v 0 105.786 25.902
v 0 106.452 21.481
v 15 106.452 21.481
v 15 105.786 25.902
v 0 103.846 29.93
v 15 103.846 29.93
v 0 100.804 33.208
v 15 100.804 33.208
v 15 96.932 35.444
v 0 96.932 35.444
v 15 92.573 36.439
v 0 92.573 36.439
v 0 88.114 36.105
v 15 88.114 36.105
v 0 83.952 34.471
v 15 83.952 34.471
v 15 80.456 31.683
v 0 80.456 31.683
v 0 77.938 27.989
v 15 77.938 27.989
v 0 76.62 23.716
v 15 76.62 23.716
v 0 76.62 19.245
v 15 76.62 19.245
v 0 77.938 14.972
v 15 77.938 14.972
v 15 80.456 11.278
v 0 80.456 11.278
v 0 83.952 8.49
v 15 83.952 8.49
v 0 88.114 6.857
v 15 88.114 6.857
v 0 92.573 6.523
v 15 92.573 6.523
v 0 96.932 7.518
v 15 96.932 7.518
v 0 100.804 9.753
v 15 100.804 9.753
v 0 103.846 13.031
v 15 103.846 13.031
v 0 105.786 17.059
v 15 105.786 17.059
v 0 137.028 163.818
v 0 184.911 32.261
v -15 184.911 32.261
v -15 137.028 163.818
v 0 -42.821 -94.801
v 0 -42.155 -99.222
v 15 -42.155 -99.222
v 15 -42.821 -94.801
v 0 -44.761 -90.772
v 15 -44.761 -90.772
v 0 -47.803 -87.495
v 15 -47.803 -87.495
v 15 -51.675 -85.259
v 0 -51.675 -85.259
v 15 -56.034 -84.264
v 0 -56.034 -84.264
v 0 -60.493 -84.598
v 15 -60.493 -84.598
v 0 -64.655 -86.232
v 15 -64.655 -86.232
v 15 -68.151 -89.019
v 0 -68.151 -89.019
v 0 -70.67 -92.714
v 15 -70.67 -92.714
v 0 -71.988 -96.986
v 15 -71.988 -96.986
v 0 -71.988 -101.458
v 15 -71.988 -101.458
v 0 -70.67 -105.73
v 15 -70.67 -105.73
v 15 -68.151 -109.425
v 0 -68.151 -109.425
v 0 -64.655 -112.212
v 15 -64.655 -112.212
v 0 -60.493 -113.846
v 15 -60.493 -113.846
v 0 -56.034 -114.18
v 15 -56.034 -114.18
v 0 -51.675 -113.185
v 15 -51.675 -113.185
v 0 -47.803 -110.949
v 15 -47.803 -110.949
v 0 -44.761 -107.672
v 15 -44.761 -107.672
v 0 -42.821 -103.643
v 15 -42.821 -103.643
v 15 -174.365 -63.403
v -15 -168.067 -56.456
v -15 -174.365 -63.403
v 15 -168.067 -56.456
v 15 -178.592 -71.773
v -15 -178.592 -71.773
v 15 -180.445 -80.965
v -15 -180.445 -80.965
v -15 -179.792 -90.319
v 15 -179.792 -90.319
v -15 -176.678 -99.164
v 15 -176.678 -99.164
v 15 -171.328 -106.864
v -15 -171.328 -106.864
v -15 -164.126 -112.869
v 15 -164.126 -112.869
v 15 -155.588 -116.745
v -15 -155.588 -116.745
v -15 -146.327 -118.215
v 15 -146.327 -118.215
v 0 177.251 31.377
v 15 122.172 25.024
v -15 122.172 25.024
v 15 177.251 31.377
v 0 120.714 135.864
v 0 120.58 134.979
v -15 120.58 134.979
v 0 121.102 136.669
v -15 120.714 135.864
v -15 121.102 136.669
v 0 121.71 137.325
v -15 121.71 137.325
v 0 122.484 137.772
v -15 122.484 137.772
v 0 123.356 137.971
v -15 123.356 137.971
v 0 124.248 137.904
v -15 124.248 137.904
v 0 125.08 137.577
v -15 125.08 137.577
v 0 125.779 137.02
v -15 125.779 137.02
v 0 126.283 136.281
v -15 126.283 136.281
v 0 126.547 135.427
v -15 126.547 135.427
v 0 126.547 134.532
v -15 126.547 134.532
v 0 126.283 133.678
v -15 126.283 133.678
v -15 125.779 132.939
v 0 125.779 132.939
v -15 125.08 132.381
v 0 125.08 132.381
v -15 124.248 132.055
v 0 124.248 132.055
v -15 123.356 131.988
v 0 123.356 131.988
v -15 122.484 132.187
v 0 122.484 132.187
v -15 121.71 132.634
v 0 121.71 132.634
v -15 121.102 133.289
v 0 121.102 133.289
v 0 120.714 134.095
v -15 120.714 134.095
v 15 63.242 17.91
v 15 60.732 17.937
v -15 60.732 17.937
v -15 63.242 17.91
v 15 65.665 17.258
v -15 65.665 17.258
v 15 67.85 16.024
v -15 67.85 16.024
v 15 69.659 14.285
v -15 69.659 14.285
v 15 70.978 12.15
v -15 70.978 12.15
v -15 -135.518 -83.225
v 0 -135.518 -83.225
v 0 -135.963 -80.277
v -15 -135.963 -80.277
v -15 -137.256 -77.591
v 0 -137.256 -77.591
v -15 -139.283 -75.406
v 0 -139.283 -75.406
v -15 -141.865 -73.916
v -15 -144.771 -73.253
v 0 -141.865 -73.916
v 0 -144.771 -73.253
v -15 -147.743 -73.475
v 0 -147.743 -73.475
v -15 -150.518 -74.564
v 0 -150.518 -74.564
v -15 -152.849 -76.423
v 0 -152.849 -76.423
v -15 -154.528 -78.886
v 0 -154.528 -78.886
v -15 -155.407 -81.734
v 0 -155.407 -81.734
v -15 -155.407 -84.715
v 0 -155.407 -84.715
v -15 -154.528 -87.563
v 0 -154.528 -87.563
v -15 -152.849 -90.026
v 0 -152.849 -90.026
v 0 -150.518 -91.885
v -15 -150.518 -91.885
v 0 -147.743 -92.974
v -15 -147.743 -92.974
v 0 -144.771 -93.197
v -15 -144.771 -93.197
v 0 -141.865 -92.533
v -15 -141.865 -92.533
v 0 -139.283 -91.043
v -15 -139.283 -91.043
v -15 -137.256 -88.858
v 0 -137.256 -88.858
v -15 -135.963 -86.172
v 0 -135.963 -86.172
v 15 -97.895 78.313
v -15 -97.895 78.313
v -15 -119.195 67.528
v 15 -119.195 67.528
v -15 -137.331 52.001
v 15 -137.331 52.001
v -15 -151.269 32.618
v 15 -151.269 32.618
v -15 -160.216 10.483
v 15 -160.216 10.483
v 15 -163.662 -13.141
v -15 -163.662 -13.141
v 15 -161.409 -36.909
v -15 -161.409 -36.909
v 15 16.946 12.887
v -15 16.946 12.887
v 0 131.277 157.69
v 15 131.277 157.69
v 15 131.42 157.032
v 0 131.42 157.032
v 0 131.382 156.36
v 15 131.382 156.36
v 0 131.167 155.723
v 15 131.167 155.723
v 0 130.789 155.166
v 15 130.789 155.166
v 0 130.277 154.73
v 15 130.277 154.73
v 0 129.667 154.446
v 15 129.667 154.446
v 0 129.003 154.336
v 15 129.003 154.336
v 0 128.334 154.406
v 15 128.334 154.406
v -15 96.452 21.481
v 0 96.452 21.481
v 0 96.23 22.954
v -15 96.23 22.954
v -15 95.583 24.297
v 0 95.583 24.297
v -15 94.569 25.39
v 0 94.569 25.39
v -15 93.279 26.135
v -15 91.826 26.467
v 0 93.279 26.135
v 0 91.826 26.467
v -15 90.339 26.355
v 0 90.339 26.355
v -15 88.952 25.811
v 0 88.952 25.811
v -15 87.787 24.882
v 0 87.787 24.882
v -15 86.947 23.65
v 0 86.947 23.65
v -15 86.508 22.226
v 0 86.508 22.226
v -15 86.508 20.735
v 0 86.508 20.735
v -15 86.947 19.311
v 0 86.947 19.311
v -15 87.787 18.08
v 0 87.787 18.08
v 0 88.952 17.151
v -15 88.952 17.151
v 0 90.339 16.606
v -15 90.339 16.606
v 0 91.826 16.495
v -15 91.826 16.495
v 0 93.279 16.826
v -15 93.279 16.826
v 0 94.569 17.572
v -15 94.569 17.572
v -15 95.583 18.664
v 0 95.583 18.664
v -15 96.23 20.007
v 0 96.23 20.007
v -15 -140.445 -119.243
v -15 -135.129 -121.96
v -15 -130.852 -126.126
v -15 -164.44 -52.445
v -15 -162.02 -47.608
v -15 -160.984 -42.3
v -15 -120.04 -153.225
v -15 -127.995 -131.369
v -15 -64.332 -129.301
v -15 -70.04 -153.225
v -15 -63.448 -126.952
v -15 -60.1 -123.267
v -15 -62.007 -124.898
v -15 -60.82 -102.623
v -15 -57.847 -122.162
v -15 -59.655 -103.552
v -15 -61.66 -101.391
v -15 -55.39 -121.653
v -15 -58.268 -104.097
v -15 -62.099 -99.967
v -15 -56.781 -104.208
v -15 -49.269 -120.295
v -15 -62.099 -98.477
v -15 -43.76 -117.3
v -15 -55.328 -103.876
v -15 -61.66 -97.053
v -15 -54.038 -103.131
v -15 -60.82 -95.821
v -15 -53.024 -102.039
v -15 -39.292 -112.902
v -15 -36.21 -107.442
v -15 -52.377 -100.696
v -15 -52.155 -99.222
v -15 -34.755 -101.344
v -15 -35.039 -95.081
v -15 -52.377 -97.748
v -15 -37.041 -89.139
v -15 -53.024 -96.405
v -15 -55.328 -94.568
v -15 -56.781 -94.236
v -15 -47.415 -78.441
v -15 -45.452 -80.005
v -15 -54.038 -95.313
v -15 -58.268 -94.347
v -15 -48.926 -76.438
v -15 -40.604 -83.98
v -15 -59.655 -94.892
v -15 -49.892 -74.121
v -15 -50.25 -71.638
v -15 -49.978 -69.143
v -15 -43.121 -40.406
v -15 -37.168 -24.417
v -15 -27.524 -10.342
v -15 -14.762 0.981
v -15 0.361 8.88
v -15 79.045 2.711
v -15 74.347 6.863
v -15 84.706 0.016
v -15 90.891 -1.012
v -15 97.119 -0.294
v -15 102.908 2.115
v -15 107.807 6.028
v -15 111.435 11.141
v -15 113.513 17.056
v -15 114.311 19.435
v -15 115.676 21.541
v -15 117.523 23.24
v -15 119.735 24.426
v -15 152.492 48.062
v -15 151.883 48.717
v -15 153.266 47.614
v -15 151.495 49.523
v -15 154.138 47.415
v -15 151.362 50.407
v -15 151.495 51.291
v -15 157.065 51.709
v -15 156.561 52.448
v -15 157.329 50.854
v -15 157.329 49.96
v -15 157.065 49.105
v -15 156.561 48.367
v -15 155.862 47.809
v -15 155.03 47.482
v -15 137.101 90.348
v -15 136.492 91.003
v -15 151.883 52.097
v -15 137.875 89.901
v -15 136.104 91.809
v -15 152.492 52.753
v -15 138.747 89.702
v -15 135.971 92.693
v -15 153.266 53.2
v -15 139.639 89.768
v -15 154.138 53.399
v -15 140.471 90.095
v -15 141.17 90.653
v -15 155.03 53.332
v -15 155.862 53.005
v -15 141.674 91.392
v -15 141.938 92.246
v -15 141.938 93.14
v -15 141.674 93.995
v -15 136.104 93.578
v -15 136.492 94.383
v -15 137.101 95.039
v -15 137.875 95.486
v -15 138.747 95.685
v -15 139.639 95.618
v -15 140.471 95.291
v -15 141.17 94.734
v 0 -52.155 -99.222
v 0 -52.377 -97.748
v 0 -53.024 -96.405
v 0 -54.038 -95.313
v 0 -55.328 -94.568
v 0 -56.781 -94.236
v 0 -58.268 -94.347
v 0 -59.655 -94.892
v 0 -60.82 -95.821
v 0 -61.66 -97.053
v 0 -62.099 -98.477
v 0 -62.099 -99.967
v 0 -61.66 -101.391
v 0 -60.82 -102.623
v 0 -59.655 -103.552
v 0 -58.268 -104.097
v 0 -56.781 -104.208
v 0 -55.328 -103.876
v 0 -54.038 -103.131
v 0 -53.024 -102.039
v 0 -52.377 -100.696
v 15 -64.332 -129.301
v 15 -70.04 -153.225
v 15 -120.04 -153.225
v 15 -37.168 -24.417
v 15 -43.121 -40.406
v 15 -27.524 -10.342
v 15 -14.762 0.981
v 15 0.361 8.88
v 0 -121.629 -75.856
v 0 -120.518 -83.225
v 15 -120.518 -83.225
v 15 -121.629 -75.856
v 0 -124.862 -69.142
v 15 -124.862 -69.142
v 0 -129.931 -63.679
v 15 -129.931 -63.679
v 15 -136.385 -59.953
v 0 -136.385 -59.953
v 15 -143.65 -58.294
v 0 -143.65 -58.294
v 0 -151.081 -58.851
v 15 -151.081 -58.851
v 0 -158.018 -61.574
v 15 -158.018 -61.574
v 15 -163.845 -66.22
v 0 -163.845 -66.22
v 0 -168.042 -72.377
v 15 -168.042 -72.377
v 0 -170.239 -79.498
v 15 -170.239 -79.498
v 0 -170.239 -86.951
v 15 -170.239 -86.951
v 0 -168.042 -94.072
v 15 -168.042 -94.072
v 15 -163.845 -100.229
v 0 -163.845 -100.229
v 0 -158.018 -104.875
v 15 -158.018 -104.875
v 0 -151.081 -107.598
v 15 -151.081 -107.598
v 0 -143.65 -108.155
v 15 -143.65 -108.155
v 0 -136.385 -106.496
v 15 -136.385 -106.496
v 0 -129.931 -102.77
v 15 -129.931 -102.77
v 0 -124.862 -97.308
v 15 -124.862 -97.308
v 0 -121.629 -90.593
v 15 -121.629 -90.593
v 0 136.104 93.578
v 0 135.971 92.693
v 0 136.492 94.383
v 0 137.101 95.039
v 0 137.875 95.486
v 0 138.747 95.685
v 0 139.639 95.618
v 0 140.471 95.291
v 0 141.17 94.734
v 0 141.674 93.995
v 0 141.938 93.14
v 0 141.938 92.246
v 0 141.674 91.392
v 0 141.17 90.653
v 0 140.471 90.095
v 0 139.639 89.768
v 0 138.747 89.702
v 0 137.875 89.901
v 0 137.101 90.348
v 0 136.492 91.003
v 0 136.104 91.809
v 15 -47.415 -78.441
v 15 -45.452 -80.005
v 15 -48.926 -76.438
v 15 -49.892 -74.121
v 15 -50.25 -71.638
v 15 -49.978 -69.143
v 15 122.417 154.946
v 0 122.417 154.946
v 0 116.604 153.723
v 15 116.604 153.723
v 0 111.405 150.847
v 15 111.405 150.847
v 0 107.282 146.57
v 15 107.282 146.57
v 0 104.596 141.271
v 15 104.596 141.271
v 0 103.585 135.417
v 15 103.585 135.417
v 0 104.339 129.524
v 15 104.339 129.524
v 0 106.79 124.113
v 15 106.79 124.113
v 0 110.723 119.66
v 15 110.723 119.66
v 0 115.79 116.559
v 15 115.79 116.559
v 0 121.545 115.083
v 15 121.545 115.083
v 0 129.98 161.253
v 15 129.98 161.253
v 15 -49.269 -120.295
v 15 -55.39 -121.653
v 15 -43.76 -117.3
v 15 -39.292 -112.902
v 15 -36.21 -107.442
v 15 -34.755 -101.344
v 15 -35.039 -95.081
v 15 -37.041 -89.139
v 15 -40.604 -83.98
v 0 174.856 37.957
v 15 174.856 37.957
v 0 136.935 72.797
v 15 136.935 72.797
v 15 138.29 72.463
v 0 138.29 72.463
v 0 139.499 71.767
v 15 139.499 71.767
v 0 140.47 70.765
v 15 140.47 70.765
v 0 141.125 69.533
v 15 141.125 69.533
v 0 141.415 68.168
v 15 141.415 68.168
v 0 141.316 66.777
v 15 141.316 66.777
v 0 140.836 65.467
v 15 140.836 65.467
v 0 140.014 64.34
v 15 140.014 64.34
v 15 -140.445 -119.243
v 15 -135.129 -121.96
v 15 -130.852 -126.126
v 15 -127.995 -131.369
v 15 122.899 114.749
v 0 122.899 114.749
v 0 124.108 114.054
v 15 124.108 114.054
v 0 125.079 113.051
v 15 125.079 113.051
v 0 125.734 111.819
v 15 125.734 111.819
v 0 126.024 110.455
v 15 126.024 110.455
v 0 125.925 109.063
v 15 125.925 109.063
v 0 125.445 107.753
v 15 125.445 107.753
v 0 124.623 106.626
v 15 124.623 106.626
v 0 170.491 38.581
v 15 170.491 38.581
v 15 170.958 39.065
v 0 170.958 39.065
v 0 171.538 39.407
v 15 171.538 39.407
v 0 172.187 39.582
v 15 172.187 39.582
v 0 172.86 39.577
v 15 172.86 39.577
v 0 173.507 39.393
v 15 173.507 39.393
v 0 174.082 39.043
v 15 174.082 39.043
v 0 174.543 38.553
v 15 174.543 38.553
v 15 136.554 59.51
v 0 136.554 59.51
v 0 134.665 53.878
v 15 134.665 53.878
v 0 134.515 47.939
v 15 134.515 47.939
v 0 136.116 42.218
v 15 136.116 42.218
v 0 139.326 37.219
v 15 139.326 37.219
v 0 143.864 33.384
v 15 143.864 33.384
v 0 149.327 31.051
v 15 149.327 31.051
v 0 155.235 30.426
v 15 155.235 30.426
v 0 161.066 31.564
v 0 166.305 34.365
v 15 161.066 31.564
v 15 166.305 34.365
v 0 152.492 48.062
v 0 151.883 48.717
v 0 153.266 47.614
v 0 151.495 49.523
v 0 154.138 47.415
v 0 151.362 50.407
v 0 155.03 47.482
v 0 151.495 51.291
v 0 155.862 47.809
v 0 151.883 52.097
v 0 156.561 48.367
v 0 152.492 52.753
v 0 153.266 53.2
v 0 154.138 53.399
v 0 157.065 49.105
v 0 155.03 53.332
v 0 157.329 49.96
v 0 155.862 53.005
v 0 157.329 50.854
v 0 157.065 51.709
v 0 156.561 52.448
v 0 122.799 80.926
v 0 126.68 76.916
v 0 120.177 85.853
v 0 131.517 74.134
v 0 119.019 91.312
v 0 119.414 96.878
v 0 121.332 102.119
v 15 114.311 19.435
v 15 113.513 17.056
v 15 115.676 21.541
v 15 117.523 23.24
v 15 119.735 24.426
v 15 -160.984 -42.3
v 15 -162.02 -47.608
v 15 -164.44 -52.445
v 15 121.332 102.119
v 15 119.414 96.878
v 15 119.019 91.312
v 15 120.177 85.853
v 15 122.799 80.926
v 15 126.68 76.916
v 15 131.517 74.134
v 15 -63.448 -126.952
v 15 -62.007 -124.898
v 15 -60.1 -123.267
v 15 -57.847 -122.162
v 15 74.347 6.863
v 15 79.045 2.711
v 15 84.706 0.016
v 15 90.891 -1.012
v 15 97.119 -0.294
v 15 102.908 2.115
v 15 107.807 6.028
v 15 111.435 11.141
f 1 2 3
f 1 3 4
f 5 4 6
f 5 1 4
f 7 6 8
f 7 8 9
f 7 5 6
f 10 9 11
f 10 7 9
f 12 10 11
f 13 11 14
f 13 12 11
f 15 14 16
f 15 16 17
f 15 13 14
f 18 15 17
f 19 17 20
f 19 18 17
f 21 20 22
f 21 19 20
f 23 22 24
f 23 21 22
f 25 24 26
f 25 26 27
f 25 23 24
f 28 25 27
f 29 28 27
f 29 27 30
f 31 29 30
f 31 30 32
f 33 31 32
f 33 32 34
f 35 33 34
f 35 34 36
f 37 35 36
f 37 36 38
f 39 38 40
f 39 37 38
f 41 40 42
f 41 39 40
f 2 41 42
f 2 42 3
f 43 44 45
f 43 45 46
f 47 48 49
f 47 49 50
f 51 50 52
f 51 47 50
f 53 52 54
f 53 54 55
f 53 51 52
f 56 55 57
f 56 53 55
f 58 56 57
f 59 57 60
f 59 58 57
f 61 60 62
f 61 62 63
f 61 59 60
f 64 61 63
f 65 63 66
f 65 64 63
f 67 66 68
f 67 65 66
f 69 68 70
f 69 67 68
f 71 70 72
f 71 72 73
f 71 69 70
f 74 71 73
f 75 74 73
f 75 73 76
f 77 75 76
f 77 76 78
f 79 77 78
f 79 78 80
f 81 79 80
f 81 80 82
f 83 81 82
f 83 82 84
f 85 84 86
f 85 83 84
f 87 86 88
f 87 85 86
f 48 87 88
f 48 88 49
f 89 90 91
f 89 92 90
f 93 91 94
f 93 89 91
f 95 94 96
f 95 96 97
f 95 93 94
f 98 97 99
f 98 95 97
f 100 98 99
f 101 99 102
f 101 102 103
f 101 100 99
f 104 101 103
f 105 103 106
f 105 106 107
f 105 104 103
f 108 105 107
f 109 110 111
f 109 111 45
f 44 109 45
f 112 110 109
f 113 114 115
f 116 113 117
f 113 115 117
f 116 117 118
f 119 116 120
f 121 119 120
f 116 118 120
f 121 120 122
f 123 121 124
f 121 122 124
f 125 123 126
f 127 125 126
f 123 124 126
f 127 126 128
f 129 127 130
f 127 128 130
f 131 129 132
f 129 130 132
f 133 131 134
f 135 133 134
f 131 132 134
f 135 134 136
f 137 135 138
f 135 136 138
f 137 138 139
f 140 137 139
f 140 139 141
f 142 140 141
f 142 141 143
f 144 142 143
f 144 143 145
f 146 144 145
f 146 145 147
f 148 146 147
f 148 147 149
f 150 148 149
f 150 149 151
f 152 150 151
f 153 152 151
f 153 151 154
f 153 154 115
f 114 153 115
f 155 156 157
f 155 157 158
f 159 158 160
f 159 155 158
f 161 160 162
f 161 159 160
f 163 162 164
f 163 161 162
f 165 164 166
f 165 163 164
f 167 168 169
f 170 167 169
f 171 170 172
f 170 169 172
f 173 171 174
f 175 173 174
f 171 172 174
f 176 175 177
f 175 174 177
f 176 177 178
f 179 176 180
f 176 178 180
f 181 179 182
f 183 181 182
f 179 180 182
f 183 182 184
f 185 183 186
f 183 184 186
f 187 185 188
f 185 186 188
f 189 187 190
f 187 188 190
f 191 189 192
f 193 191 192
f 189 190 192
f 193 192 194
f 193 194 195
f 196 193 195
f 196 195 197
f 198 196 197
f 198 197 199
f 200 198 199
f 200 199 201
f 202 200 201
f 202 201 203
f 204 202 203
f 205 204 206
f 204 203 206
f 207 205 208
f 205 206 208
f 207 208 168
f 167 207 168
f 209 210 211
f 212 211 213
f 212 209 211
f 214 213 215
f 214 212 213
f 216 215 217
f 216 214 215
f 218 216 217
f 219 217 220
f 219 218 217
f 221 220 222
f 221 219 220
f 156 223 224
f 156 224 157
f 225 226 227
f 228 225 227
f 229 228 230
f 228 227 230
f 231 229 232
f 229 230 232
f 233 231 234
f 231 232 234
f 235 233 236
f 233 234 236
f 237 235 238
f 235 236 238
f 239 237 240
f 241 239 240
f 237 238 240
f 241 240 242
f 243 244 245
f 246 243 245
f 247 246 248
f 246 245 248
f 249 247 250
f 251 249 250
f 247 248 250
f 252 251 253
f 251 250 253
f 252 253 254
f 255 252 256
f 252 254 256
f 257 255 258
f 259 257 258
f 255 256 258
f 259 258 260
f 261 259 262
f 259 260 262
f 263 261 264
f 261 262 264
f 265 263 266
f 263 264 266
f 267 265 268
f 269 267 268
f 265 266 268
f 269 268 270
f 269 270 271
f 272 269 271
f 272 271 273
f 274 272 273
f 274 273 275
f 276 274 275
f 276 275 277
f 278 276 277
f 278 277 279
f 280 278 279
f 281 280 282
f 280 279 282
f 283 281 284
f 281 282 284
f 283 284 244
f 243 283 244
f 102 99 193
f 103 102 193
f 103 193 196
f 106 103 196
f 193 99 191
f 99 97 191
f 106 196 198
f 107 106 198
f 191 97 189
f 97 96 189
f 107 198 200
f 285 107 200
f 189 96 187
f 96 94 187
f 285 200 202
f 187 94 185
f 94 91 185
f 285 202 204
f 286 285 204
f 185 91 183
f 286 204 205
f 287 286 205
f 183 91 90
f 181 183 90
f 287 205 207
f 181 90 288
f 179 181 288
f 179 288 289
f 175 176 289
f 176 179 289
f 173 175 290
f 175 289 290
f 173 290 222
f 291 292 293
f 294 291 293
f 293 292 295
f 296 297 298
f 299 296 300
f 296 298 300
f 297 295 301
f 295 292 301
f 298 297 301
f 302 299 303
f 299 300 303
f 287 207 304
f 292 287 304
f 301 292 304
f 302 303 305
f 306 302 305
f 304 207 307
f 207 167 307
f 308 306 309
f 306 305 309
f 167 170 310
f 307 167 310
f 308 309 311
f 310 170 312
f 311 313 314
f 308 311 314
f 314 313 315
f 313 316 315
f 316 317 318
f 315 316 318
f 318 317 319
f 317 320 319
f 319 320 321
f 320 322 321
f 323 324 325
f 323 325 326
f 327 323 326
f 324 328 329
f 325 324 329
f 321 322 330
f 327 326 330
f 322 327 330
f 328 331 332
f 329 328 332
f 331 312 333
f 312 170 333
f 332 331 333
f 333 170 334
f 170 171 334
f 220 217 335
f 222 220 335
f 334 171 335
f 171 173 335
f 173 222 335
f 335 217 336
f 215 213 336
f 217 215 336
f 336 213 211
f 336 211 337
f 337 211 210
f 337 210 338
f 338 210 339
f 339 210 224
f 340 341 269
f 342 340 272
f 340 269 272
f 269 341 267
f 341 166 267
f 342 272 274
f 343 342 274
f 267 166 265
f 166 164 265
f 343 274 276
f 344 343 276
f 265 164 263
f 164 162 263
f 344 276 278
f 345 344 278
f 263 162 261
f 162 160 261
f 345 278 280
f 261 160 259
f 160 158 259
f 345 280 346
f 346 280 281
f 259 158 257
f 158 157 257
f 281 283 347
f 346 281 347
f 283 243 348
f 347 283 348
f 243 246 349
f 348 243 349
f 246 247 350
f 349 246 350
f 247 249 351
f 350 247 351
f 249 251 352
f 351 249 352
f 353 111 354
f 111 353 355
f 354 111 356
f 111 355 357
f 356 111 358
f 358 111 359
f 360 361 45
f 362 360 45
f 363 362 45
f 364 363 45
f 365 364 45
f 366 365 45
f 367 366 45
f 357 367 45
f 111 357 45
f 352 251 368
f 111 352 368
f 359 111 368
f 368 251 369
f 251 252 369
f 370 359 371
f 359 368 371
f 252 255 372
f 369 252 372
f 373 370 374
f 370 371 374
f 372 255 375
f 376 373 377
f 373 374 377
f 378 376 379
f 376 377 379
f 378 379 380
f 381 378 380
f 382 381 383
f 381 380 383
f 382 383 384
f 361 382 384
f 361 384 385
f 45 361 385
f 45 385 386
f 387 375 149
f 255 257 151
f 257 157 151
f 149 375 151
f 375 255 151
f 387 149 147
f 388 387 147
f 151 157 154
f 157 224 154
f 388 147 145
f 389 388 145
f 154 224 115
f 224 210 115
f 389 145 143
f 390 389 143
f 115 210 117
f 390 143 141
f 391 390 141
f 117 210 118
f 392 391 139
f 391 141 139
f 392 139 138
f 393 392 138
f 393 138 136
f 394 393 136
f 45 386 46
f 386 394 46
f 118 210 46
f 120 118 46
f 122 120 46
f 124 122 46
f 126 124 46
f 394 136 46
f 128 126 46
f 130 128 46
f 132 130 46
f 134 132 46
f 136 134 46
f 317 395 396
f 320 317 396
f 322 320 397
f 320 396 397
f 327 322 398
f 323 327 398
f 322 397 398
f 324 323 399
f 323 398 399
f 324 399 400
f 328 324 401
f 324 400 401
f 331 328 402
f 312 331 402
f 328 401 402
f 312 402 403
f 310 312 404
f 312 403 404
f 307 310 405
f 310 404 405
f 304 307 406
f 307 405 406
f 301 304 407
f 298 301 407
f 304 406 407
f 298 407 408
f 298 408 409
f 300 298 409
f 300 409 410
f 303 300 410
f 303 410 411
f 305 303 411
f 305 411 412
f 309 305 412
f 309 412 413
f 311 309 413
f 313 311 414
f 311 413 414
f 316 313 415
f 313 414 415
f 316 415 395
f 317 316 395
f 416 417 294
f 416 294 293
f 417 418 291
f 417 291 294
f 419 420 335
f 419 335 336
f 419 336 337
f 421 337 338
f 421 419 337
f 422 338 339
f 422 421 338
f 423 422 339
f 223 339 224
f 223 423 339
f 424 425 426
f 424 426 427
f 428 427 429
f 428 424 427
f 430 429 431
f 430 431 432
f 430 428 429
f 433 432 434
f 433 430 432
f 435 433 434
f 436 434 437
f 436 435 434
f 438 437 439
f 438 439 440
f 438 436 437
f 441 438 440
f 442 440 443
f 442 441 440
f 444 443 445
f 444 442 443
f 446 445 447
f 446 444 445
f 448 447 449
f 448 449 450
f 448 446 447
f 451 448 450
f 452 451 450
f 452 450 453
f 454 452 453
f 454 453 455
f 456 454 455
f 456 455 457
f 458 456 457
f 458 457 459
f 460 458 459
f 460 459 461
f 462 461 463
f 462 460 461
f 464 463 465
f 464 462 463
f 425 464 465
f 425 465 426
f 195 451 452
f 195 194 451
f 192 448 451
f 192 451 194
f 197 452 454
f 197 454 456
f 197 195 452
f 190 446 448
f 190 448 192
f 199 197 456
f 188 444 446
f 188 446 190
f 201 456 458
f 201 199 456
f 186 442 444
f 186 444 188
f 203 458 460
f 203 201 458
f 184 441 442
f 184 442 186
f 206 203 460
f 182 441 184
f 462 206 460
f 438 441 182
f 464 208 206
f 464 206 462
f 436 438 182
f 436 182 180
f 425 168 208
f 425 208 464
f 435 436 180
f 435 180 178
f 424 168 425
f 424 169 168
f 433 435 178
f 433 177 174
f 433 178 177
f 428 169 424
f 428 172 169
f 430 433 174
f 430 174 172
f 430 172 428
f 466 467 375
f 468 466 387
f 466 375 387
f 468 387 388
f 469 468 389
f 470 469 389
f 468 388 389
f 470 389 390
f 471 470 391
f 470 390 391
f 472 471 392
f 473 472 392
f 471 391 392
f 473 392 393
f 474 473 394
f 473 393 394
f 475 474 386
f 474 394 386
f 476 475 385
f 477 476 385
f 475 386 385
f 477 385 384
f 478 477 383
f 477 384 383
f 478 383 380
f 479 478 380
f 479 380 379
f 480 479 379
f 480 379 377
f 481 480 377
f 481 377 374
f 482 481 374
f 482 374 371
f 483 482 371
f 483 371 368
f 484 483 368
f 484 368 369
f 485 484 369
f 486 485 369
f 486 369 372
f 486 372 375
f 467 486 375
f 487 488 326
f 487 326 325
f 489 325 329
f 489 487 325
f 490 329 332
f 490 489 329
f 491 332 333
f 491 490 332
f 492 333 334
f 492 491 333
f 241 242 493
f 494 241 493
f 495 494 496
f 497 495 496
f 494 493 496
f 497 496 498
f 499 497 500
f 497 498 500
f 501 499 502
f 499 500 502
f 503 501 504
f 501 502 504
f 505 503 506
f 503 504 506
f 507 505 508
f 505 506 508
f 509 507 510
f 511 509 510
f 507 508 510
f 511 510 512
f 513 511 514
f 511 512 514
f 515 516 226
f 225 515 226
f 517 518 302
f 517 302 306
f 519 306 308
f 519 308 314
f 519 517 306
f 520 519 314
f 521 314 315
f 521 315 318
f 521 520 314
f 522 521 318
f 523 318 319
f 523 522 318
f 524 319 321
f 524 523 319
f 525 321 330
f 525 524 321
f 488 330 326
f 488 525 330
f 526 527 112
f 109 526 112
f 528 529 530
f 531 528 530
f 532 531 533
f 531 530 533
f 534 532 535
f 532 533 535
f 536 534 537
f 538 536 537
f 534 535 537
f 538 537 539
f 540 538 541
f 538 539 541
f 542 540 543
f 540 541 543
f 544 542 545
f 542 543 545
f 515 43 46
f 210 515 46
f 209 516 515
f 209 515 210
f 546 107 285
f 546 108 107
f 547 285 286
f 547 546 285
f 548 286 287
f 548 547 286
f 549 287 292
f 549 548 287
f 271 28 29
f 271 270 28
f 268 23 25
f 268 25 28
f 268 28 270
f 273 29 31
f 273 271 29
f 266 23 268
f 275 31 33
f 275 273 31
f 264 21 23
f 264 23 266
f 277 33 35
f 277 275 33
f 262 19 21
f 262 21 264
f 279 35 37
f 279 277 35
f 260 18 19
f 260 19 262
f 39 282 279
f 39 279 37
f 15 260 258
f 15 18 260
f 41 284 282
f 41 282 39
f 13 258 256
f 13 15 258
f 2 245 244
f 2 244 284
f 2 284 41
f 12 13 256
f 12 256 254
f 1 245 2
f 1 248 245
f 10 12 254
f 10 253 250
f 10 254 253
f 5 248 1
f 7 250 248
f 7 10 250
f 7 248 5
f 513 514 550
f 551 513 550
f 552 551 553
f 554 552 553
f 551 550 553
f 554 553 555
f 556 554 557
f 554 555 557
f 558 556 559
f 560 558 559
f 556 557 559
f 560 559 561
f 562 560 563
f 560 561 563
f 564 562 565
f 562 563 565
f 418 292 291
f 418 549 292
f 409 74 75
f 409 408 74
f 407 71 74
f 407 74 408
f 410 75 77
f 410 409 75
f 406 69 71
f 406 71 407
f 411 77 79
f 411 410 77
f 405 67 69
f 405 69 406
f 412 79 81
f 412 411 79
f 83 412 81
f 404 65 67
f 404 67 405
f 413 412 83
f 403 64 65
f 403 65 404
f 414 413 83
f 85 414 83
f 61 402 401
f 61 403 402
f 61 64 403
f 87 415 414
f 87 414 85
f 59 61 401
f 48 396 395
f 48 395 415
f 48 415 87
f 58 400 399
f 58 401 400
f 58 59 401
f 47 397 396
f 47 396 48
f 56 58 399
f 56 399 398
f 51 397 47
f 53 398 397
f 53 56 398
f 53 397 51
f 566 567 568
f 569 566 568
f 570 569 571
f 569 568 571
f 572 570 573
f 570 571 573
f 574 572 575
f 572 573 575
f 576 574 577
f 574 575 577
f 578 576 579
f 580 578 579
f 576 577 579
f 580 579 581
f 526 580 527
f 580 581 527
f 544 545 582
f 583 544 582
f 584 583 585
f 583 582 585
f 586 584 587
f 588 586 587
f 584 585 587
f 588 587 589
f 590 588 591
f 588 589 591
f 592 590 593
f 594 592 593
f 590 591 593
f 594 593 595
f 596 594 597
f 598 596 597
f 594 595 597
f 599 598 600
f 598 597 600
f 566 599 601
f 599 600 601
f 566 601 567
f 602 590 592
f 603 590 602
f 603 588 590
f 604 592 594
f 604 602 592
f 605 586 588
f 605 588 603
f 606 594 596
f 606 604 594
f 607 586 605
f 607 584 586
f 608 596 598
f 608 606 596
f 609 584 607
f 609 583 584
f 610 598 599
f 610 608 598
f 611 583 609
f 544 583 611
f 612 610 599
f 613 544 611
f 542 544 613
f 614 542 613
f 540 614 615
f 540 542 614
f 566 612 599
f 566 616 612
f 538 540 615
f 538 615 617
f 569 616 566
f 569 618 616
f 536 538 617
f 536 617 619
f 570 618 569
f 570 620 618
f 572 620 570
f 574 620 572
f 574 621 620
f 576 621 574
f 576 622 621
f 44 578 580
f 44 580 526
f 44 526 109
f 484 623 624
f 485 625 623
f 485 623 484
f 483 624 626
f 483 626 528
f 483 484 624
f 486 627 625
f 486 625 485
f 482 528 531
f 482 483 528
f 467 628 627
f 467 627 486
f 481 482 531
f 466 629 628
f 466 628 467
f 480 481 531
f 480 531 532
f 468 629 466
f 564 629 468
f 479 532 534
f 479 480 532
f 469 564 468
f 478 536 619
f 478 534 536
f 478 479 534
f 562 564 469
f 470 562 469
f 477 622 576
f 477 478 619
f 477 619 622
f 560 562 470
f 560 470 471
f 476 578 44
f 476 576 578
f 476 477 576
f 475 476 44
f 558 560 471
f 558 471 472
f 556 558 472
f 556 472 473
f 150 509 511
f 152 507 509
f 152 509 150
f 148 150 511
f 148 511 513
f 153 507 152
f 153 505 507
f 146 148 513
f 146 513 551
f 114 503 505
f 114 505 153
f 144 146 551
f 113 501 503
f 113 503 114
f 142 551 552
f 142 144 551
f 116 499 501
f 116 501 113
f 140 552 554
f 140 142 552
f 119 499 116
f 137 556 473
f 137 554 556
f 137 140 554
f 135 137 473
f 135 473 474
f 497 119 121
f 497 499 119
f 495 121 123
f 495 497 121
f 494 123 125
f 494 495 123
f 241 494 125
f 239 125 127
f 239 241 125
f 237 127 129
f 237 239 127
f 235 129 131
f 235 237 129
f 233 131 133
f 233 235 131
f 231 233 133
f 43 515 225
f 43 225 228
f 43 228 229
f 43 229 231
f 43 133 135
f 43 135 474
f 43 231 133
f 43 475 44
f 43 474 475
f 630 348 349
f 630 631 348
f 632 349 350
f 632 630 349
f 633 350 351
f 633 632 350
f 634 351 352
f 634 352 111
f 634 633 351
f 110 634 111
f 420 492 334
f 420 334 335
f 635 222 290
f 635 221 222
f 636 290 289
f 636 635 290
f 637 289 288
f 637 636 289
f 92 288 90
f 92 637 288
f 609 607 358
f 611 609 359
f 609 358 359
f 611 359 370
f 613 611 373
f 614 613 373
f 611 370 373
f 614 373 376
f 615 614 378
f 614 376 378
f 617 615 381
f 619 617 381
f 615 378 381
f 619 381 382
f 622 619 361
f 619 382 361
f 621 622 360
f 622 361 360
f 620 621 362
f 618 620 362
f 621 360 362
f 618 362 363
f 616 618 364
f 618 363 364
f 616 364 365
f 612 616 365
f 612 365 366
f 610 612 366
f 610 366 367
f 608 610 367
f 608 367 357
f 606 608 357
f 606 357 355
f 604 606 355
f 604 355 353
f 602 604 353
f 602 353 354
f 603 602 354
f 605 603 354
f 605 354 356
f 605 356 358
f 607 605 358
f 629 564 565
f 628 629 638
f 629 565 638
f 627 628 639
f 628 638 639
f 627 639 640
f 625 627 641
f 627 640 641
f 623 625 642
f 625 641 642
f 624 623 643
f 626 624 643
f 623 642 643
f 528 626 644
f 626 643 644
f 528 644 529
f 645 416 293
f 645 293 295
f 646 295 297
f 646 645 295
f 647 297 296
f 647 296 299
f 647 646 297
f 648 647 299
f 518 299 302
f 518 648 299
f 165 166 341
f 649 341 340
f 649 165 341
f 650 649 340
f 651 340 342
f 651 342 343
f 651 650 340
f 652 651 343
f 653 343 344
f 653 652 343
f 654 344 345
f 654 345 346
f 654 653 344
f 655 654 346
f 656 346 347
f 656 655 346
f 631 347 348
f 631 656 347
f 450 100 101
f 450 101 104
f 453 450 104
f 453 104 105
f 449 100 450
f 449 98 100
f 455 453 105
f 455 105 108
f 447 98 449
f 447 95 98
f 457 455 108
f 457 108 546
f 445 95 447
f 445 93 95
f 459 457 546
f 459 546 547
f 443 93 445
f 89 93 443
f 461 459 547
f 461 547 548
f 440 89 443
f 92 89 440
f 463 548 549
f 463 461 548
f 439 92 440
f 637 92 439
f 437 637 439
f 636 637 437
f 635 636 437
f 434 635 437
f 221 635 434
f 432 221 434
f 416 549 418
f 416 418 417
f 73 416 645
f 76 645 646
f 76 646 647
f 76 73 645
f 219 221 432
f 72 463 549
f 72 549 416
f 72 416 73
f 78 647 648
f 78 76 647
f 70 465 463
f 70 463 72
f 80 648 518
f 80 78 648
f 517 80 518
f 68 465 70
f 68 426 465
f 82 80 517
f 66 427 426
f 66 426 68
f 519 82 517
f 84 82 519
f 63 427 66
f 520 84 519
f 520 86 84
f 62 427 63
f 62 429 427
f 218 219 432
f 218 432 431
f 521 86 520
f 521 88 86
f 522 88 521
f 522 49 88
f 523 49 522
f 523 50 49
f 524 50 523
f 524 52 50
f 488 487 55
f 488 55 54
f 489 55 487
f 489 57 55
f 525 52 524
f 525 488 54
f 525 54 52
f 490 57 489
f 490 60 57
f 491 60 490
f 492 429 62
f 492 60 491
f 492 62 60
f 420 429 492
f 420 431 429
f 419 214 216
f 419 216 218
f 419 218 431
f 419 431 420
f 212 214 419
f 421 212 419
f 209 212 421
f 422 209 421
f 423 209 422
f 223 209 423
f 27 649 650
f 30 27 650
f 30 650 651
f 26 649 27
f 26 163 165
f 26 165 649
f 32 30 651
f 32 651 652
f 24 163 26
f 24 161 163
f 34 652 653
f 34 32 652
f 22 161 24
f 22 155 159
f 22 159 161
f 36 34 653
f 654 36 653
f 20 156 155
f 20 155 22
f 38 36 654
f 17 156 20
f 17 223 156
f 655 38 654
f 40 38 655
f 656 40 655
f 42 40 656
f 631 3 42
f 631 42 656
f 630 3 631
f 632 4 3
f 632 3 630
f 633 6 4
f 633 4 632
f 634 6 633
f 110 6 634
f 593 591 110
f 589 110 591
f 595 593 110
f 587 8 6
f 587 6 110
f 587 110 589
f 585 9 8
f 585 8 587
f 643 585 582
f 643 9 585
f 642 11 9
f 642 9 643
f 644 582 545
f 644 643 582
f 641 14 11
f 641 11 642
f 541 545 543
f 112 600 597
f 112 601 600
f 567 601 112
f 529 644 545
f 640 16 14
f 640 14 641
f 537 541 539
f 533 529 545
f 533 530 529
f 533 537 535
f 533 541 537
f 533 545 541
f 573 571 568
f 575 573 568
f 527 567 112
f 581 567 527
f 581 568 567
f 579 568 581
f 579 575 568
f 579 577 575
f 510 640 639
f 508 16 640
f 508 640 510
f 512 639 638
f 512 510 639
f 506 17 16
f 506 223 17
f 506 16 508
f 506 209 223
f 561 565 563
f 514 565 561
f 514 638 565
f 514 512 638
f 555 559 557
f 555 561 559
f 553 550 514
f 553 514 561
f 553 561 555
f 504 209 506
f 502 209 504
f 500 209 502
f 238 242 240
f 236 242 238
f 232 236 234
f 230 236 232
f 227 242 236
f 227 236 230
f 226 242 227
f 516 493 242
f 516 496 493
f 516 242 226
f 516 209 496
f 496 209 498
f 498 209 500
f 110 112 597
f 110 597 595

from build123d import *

# Parameters (mm, degrees)
F0_R     = 25
F0_R_2   = 15
F1_DEPTH = 15
F0_R_3   = 5
F2_DEPTH = 15
F0_R_4   = 10
F3_DEPTH = 15
F5_D     = 6
F6_DEPTH = 15


with BuildPart() as f1:
    # F0 (on Right) → F1 (new body, symmetric)
    with BuildSketch(Plane.YZ):
        with BuildLine():
            Line((-127.994926, -131.369472), (-120.040328, -153.224552))
            Line((-120.040328, -153.224552), (-70.040328, -153.224552))
            Line((-70.040328, -153.224552), (-64.332035, -129.30089))
            ThreePointArc((-64.332035, -129.30089), (-61.104878, -124.022259), (-55.3897, -121.652611))
            ThreePointArc((-55.3897, -121.652611), (-35.269445, -104.443983), (-45.452365, -80.004881))
            ThreePointArc((-45.452365, -80.004881), (-49.481937, -75.310092), (-49.978107, -69.143058))
            Line((-49.978107, -69.143058), (-43.121345, -40.406121))
            ThreePointArc((-43.121345, -40.406121), (-21.489193, -4.290197), (16.946071, 12.886543))
            Line((16.946071, 12.886543), (60.732447, 17.937229))
            ThreePointArc((60.732447, 17.937229), (66.796491, 16.710091), (70.977938, 12.150048))
            ThreePointArc((70.977938, 12.150048), (94.030291, -0.871109), (113.512771, 17.05637))
            ThreePointArc((113.512771, 17.05637), (116.546235, 22.448642), (122.171651, 25.024139))
            Line((122.171651, 25.024139), (184.91068, 32.260982))
            Line((184.91068, 32.260982), (137.02786, 163.817949))
            Line((137.02786, 163.817949), (-97.895296, 78.312913))
            ThreePointArc((-97.895296, 78.312913), (-151.269454, 32.618013), (-161.408791, -36.909094))
            ThreePointArc((-161.408791, -36.909094), (-162.020042, -47.608288), (-168.06693, -56.455973))
            ThreePointArc((-168.06693, -56.455973), (-178.532493, -94.846055), (-146.326766, -118.215212))
            ThreePointArc((-146.326766, -118.215212), (-135.128773, -121.960435), (-127.994926, -131.369472))
        make_face()
        with Locations((-145.518244, -83.224552)):
            Circle(F0_R, mode=Mode.SUBTRACT)
        with Locations((-57.155071, -99.221974)):
            Circle(F0_R_2, mode=Mode.SUBTRACT)
        with Locations((91.452049, 21.480684)):
            Circle(F0_R_2, mode=Mode.SUBTRACT)
    extrude(amount=F1_DEPTH, both=True)

    # F0 (on Right) → F2 (join)
    with BuildSketch(Plane.YZ):
        with Locations((91.452049, 21.480684)):
            Circle(F0_R_2)
        with Locations((91.452049, 21.480684)):
            Circle(F0_R_3, mode=Mode.SUBTRACT)
        with Locations((-57.155071, -99.221974)):
            Circle(F0_R_2)
        with Locations((-57.155071, -99.221974)):
            Circle(F0_R_3, mode=Mode.SUBTRACT)
    extrude(amount=-F2_DEPTH)

    # F0 (on Right) → F3 (join)
    with BuildSketch(Plane.YZ):
        with Locations((-145.518244, -83.224552)):
            Circle(F0_R)
        with Locations((-145.518244, -83.224552)):
            Circle(F0_R_4, mode=Mode.SUBTRACT)
    extrude(amount=-F3_DEPTH)

    # F5 (through all)
    with Locations(Plane.YZ.offset(15)):
        with Locations((123.580229, 134.979412), (138.971135, 92.693244), (154.362042, 50.407076)):
            Hole(F5_D / 2)

    # F4 (on face) → F6 (cut)
    with BuildSketch(Plane.YZ.offset(15)):
        with BuildLine():
            Line((137.02786, 163.817949), (129.980165, 161.252798))
            Line((129.980165, 161.252798), (131.277007, 157.689753))
            ThreePointArc((131.277007, 157.689753), (130.789297, 155.16595), (128.333604, 154.406337))
            ThreePointArc((128.333604, 154.406337), (103.871801, 138.38204), (121.544541, 115.083282))
            ThreePointArc((121.544541, 115.083282), (125.734082, 111.81935), (124.622722, 106.626049))
            ThreePointArc((124.622722, 106.626049), (120.177283, 85.852841), (136.935447, 72.797114))
            ThreePointArc((136.935447, 72.797114), (141.124989, 69.533182), (140.013629, 64.339881))
            ThreePointArc((140.013629, 64.339881), (141.451678, 35.132178), (170.490725, 38.580598))
            ThreePointArc((170.490725, 38.580598), (172.860165, 39.577191), (174.856042, 37.957339))
            Line((174.856042, 37.957339), (177.250928, 31.377442))
            Line((177.250928, 31.377442), (184.91068, 32.260982))
            Line((184.91068, 32.260982), (137.02786, 163.817949))
        make_face()
    extrude(amount=-F6_DEPTH, mode=Mode.SUBTRACT)


solid = f1.part
